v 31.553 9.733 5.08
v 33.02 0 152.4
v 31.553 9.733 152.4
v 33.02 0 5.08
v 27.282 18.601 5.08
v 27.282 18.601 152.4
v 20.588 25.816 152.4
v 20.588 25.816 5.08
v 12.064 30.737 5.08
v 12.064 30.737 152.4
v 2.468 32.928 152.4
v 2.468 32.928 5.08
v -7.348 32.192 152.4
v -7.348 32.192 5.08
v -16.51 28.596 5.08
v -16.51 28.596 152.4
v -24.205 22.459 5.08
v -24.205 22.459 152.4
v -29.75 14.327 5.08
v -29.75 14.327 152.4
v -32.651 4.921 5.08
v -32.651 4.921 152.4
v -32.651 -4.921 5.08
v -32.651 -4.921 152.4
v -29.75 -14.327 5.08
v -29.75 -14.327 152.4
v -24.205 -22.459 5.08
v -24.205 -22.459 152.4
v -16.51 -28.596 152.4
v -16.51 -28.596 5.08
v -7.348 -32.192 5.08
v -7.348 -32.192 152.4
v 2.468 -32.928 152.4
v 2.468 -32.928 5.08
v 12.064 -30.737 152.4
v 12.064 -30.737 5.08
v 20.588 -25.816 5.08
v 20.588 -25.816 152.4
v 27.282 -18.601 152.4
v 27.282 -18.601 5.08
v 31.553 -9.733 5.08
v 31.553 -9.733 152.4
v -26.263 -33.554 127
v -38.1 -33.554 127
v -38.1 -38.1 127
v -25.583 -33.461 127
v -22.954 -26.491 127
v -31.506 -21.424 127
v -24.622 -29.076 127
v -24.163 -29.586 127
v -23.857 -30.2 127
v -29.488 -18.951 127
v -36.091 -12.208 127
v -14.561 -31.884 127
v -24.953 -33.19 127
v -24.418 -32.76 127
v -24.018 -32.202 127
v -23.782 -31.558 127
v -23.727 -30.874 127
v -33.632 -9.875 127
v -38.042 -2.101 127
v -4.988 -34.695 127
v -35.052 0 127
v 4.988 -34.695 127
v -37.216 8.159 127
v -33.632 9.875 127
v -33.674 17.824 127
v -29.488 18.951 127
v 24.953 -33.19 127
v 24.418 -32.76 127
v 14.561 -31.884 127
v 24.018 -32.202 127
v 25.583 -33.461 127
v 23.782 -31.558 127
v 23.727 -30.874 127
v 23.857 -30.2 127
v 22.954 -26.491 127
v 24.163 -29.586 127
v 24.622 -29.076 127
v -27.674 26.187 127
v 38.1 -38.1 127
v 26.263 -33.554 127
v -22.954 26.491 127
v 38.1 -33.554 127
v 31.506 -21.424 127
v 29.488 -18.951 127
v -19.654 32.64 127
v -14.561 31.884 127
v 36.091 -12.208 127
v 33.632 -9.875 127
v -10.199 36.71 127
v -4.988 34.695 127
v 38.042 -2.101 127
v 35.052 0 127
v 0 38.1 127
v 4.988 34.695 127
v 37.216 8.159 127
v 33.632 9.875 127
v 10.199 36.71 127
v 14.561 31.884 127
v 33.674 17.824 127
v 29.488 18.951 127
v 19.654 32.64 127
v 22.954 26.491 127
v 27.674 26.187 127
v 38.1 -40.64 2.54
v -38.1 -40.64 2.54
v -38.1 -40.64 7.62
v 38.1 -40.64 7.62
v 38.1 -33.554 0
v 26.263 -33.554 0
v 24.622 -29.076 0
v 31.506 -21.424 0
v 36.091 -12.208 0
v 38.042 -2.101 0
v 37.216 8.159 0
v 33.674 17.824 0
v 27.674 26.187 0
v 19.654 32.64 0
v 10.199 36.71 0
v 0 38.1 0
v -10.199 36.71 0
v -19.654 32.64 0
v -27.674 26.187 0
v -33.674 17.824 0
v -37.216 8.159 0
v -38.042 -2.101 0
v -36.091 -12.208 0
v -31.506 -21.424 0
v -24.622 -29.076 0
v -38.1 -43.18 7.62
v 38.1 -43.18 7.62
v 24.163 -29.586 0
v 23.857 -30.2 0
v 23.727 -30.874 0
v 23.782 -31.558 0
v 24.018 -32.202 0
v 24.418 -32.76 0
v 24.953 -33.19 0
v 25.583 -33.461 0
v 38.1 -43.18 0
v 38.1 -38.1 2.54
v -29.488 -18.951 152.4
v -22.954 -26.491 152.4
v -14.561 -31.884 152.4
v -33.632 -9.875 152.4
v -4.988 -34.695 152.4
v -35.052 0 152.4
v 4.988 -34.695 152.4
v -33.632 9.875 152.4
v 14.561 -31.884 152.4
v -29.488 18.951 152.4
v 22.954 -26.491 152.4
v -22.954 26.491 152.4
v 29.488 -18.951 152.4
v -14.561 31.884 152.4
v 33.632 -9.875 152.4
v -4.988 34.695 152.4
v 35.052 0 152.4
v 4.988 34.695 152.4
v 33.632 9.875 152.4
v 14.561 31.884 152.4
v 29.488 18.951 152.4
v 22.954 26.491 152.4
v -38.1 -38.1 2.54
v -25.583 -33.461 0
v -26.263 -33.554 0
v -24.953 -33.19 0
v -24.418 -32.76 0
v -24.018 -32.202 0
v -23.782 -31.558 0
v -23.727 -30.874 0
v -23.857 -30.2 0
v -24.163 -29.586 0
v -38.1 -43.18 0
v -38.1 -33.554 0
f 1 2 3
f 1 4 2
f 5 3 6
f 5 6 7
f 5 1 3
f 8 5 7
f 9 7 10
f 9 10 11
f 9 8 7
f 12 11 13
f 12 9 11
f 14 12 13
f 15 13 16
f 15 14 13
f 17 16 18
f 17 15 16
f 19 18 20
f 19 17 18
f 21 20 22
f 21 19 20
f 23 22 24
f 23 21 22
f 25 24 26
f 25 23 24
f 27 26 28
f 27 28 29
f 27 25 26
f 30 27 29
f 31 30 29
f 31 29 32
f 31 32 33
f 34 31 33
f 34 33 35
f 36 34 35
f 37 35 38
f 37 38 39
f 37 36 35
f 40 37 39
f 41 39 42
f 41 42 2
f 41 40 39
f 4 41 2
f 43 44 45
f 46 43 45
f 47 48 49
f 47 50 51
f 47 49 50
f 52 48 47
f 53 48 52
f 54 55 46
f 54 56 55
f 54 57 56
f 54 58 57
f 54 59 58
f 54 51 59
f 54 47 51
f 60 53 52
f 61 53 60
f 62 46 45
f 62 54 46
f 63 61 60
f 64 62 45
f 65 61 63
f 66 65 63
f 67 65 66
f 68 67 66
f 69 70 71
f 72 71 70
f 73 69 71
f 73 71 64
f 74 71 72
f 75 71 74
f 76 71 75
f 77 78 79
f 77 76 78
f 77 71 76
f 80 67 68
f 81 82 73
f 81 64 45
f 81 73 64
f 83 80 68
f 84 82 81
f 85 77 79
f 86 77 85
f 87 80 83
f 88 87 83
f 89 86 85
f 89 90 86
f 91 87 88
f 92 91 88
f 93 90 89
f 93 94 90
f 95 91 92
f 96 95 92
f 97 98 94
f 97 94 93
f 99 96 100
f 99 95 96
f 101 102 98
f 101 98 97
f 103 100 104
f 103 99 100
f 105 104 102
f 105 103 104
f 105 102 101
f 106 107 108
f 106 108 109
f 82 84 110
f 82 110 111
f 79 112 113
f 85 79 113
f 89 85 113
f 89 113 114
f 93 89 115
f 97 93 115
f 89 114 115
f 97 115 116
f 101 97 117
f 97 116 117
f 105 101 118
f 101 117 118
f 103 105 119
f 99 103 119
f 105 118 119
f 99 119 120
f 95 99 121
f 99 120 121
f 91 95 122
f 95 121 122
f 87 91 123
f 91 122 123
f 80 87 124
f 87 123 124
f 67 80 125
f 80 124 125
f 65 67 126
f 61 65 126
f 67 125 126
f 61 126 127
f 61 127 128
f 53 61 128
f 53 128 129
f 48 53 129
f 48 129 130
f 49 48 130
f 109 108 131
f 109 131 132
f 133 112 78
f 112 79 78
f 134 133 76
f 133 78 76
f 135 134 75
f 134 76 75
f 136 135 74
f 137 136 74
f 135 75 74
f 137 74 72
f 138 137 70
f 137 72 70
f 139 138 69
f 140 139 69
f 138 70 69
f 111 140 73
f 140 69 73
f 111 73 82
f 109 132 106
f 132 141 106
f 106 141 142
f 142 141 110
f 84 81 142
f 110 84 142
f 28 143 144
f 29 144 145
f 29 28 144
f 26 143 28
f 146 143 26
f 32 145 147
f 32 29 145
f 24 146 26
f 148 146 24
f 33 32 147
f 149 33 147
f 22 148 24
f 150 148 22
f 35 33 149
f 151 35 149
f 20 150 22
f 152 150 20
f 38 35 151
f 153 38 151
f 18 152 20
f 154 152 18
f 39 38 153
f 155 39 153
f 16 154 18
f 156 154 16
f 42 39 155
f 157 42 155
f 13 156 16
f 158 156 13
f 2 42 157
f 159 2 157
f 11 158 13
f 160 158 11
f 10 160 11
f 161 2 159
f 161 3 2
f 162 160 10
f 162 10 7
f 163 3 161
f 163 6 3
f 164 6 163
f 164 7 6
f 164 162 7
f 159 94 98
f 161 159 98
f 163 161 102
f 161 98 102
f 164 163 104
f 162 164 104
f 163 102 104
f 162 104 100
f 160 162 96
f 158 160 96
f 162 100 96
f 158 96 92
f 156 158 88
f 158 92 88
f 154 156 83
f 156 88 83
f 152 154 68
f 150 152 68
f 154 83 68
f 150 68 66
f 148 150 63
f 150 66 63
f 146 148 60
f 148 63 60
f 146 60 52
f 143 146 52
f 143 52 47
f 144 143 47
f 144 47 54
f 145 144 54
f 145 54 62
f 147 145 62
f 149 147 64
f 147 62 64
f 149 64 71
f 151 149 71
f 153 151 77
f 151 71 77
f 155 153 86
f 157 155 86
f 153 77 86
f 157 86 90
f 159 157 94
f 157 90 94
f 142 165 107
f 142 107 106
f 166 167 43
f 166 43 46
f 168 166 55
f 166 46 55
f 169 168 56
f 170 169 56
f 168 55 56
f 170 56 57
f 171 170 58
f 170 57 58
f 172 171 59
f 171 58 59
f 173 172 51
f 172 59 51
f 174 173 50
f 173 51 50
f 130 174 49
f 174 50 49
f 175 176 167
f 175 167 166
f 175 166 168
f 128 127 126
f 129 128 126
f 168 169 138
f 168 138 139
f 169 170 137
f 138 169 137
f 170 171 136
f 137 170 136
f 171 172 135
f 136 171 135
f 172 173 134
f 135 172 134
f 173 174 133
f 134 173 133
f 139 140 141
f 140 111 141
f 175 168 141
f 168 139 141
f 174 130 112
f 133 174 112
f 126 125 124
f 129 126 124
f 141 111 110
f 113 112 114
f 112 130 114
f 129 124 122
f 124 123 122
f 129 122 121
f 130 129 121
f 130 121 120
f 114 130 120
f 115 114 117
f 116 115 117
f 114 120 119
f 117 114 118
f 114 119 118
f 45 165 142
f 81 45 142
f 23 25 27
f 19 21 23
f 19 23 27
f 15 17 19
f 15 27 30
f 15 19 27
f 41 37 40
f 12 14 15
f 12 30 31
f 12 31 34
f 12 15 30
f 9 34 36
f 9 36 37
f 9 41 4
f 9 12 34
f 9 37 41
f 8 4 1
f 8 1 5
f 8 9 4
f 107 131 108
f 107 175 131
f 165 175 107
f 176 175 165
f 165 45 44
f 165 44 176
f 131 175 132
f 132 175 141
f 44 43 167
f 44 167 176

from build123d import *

# Parameters (mm, degrees)
F1_DEPTH = 127
F2_R     = 33.02
F3_DEPTH = 121.92
F2_R_2   = 35.052
F4_DEPTH = 25.4
F5_R     = 2.54
F6_W     = 76.2
F6_H     = 2.54
F7_DEPTH = 5.08
F8_W     = 76.2
F8_H     = 2.54
F9_DEPTH = 5.08


with BuildPart() as f1:
    # F0 (on Top) → F1 (new body)
    with BuildSketch(Plane.XY):
        with BuildLine():
            Line((38.1, -33.553976), (18.048288, -33.553976))
            ThreePointArc((18.048288, -33.553976), (0, 38.1), (-18.048288, -33.553976))
            Line((-18.048288, -33.553976), (-38.1, -33.553976))
            Line((-38.1, -33.553976), (-38.1, -38.1))
            Line((-38.1, -38.1), (38.1, -38.1))
            Line((38.1, -38.1), (38.1, -33.553976))
        make_face()
    extrude(amount=F1_DEPTH)

    # F2 (on face) → F3 (cut)
    with BuildSketch(Plane.XY.offset(127)):
        Circle(F2_R)
    extrude(amount=-F3_DEPTH, mode=Mode.SUBTRACT)

    # F2 (on face) → F4 (join)
    with BuildSketch(Plane.XY.offset(127)):
        Circle(F2_R_2)
        Circle(F2_R, mode=Mode.SUBTRACT)
    extrude(amount=F4_DEPTH)

    # F5
    f5_edges = [f1.edges().sort_by_distance(p)[0] for p in [
        (18.048288, -33.553976, 63.5),
        (-18.048288, -33.553976, 63.5),
    ]]
    fillet(f5_edges, radius=F5_R)

    # F6 (on face) → F7 (join)
    with BuildSketch(Plane.XZ.offset(38.1)):
        with Locations((0, 1.27)):
            Rectangle(F6_W, F6_H)
    extrude(amount=F7_DEPTH)

    # F8 (on face) → F9 (join)
    with BuildSketch(Plane.XY.offset(2.54)):
        with Locations((0, -41.91)):
            Rectangle(F8_W, F8_H)
    extrude(amount=F9_DEPTH)


solid = f1.part
